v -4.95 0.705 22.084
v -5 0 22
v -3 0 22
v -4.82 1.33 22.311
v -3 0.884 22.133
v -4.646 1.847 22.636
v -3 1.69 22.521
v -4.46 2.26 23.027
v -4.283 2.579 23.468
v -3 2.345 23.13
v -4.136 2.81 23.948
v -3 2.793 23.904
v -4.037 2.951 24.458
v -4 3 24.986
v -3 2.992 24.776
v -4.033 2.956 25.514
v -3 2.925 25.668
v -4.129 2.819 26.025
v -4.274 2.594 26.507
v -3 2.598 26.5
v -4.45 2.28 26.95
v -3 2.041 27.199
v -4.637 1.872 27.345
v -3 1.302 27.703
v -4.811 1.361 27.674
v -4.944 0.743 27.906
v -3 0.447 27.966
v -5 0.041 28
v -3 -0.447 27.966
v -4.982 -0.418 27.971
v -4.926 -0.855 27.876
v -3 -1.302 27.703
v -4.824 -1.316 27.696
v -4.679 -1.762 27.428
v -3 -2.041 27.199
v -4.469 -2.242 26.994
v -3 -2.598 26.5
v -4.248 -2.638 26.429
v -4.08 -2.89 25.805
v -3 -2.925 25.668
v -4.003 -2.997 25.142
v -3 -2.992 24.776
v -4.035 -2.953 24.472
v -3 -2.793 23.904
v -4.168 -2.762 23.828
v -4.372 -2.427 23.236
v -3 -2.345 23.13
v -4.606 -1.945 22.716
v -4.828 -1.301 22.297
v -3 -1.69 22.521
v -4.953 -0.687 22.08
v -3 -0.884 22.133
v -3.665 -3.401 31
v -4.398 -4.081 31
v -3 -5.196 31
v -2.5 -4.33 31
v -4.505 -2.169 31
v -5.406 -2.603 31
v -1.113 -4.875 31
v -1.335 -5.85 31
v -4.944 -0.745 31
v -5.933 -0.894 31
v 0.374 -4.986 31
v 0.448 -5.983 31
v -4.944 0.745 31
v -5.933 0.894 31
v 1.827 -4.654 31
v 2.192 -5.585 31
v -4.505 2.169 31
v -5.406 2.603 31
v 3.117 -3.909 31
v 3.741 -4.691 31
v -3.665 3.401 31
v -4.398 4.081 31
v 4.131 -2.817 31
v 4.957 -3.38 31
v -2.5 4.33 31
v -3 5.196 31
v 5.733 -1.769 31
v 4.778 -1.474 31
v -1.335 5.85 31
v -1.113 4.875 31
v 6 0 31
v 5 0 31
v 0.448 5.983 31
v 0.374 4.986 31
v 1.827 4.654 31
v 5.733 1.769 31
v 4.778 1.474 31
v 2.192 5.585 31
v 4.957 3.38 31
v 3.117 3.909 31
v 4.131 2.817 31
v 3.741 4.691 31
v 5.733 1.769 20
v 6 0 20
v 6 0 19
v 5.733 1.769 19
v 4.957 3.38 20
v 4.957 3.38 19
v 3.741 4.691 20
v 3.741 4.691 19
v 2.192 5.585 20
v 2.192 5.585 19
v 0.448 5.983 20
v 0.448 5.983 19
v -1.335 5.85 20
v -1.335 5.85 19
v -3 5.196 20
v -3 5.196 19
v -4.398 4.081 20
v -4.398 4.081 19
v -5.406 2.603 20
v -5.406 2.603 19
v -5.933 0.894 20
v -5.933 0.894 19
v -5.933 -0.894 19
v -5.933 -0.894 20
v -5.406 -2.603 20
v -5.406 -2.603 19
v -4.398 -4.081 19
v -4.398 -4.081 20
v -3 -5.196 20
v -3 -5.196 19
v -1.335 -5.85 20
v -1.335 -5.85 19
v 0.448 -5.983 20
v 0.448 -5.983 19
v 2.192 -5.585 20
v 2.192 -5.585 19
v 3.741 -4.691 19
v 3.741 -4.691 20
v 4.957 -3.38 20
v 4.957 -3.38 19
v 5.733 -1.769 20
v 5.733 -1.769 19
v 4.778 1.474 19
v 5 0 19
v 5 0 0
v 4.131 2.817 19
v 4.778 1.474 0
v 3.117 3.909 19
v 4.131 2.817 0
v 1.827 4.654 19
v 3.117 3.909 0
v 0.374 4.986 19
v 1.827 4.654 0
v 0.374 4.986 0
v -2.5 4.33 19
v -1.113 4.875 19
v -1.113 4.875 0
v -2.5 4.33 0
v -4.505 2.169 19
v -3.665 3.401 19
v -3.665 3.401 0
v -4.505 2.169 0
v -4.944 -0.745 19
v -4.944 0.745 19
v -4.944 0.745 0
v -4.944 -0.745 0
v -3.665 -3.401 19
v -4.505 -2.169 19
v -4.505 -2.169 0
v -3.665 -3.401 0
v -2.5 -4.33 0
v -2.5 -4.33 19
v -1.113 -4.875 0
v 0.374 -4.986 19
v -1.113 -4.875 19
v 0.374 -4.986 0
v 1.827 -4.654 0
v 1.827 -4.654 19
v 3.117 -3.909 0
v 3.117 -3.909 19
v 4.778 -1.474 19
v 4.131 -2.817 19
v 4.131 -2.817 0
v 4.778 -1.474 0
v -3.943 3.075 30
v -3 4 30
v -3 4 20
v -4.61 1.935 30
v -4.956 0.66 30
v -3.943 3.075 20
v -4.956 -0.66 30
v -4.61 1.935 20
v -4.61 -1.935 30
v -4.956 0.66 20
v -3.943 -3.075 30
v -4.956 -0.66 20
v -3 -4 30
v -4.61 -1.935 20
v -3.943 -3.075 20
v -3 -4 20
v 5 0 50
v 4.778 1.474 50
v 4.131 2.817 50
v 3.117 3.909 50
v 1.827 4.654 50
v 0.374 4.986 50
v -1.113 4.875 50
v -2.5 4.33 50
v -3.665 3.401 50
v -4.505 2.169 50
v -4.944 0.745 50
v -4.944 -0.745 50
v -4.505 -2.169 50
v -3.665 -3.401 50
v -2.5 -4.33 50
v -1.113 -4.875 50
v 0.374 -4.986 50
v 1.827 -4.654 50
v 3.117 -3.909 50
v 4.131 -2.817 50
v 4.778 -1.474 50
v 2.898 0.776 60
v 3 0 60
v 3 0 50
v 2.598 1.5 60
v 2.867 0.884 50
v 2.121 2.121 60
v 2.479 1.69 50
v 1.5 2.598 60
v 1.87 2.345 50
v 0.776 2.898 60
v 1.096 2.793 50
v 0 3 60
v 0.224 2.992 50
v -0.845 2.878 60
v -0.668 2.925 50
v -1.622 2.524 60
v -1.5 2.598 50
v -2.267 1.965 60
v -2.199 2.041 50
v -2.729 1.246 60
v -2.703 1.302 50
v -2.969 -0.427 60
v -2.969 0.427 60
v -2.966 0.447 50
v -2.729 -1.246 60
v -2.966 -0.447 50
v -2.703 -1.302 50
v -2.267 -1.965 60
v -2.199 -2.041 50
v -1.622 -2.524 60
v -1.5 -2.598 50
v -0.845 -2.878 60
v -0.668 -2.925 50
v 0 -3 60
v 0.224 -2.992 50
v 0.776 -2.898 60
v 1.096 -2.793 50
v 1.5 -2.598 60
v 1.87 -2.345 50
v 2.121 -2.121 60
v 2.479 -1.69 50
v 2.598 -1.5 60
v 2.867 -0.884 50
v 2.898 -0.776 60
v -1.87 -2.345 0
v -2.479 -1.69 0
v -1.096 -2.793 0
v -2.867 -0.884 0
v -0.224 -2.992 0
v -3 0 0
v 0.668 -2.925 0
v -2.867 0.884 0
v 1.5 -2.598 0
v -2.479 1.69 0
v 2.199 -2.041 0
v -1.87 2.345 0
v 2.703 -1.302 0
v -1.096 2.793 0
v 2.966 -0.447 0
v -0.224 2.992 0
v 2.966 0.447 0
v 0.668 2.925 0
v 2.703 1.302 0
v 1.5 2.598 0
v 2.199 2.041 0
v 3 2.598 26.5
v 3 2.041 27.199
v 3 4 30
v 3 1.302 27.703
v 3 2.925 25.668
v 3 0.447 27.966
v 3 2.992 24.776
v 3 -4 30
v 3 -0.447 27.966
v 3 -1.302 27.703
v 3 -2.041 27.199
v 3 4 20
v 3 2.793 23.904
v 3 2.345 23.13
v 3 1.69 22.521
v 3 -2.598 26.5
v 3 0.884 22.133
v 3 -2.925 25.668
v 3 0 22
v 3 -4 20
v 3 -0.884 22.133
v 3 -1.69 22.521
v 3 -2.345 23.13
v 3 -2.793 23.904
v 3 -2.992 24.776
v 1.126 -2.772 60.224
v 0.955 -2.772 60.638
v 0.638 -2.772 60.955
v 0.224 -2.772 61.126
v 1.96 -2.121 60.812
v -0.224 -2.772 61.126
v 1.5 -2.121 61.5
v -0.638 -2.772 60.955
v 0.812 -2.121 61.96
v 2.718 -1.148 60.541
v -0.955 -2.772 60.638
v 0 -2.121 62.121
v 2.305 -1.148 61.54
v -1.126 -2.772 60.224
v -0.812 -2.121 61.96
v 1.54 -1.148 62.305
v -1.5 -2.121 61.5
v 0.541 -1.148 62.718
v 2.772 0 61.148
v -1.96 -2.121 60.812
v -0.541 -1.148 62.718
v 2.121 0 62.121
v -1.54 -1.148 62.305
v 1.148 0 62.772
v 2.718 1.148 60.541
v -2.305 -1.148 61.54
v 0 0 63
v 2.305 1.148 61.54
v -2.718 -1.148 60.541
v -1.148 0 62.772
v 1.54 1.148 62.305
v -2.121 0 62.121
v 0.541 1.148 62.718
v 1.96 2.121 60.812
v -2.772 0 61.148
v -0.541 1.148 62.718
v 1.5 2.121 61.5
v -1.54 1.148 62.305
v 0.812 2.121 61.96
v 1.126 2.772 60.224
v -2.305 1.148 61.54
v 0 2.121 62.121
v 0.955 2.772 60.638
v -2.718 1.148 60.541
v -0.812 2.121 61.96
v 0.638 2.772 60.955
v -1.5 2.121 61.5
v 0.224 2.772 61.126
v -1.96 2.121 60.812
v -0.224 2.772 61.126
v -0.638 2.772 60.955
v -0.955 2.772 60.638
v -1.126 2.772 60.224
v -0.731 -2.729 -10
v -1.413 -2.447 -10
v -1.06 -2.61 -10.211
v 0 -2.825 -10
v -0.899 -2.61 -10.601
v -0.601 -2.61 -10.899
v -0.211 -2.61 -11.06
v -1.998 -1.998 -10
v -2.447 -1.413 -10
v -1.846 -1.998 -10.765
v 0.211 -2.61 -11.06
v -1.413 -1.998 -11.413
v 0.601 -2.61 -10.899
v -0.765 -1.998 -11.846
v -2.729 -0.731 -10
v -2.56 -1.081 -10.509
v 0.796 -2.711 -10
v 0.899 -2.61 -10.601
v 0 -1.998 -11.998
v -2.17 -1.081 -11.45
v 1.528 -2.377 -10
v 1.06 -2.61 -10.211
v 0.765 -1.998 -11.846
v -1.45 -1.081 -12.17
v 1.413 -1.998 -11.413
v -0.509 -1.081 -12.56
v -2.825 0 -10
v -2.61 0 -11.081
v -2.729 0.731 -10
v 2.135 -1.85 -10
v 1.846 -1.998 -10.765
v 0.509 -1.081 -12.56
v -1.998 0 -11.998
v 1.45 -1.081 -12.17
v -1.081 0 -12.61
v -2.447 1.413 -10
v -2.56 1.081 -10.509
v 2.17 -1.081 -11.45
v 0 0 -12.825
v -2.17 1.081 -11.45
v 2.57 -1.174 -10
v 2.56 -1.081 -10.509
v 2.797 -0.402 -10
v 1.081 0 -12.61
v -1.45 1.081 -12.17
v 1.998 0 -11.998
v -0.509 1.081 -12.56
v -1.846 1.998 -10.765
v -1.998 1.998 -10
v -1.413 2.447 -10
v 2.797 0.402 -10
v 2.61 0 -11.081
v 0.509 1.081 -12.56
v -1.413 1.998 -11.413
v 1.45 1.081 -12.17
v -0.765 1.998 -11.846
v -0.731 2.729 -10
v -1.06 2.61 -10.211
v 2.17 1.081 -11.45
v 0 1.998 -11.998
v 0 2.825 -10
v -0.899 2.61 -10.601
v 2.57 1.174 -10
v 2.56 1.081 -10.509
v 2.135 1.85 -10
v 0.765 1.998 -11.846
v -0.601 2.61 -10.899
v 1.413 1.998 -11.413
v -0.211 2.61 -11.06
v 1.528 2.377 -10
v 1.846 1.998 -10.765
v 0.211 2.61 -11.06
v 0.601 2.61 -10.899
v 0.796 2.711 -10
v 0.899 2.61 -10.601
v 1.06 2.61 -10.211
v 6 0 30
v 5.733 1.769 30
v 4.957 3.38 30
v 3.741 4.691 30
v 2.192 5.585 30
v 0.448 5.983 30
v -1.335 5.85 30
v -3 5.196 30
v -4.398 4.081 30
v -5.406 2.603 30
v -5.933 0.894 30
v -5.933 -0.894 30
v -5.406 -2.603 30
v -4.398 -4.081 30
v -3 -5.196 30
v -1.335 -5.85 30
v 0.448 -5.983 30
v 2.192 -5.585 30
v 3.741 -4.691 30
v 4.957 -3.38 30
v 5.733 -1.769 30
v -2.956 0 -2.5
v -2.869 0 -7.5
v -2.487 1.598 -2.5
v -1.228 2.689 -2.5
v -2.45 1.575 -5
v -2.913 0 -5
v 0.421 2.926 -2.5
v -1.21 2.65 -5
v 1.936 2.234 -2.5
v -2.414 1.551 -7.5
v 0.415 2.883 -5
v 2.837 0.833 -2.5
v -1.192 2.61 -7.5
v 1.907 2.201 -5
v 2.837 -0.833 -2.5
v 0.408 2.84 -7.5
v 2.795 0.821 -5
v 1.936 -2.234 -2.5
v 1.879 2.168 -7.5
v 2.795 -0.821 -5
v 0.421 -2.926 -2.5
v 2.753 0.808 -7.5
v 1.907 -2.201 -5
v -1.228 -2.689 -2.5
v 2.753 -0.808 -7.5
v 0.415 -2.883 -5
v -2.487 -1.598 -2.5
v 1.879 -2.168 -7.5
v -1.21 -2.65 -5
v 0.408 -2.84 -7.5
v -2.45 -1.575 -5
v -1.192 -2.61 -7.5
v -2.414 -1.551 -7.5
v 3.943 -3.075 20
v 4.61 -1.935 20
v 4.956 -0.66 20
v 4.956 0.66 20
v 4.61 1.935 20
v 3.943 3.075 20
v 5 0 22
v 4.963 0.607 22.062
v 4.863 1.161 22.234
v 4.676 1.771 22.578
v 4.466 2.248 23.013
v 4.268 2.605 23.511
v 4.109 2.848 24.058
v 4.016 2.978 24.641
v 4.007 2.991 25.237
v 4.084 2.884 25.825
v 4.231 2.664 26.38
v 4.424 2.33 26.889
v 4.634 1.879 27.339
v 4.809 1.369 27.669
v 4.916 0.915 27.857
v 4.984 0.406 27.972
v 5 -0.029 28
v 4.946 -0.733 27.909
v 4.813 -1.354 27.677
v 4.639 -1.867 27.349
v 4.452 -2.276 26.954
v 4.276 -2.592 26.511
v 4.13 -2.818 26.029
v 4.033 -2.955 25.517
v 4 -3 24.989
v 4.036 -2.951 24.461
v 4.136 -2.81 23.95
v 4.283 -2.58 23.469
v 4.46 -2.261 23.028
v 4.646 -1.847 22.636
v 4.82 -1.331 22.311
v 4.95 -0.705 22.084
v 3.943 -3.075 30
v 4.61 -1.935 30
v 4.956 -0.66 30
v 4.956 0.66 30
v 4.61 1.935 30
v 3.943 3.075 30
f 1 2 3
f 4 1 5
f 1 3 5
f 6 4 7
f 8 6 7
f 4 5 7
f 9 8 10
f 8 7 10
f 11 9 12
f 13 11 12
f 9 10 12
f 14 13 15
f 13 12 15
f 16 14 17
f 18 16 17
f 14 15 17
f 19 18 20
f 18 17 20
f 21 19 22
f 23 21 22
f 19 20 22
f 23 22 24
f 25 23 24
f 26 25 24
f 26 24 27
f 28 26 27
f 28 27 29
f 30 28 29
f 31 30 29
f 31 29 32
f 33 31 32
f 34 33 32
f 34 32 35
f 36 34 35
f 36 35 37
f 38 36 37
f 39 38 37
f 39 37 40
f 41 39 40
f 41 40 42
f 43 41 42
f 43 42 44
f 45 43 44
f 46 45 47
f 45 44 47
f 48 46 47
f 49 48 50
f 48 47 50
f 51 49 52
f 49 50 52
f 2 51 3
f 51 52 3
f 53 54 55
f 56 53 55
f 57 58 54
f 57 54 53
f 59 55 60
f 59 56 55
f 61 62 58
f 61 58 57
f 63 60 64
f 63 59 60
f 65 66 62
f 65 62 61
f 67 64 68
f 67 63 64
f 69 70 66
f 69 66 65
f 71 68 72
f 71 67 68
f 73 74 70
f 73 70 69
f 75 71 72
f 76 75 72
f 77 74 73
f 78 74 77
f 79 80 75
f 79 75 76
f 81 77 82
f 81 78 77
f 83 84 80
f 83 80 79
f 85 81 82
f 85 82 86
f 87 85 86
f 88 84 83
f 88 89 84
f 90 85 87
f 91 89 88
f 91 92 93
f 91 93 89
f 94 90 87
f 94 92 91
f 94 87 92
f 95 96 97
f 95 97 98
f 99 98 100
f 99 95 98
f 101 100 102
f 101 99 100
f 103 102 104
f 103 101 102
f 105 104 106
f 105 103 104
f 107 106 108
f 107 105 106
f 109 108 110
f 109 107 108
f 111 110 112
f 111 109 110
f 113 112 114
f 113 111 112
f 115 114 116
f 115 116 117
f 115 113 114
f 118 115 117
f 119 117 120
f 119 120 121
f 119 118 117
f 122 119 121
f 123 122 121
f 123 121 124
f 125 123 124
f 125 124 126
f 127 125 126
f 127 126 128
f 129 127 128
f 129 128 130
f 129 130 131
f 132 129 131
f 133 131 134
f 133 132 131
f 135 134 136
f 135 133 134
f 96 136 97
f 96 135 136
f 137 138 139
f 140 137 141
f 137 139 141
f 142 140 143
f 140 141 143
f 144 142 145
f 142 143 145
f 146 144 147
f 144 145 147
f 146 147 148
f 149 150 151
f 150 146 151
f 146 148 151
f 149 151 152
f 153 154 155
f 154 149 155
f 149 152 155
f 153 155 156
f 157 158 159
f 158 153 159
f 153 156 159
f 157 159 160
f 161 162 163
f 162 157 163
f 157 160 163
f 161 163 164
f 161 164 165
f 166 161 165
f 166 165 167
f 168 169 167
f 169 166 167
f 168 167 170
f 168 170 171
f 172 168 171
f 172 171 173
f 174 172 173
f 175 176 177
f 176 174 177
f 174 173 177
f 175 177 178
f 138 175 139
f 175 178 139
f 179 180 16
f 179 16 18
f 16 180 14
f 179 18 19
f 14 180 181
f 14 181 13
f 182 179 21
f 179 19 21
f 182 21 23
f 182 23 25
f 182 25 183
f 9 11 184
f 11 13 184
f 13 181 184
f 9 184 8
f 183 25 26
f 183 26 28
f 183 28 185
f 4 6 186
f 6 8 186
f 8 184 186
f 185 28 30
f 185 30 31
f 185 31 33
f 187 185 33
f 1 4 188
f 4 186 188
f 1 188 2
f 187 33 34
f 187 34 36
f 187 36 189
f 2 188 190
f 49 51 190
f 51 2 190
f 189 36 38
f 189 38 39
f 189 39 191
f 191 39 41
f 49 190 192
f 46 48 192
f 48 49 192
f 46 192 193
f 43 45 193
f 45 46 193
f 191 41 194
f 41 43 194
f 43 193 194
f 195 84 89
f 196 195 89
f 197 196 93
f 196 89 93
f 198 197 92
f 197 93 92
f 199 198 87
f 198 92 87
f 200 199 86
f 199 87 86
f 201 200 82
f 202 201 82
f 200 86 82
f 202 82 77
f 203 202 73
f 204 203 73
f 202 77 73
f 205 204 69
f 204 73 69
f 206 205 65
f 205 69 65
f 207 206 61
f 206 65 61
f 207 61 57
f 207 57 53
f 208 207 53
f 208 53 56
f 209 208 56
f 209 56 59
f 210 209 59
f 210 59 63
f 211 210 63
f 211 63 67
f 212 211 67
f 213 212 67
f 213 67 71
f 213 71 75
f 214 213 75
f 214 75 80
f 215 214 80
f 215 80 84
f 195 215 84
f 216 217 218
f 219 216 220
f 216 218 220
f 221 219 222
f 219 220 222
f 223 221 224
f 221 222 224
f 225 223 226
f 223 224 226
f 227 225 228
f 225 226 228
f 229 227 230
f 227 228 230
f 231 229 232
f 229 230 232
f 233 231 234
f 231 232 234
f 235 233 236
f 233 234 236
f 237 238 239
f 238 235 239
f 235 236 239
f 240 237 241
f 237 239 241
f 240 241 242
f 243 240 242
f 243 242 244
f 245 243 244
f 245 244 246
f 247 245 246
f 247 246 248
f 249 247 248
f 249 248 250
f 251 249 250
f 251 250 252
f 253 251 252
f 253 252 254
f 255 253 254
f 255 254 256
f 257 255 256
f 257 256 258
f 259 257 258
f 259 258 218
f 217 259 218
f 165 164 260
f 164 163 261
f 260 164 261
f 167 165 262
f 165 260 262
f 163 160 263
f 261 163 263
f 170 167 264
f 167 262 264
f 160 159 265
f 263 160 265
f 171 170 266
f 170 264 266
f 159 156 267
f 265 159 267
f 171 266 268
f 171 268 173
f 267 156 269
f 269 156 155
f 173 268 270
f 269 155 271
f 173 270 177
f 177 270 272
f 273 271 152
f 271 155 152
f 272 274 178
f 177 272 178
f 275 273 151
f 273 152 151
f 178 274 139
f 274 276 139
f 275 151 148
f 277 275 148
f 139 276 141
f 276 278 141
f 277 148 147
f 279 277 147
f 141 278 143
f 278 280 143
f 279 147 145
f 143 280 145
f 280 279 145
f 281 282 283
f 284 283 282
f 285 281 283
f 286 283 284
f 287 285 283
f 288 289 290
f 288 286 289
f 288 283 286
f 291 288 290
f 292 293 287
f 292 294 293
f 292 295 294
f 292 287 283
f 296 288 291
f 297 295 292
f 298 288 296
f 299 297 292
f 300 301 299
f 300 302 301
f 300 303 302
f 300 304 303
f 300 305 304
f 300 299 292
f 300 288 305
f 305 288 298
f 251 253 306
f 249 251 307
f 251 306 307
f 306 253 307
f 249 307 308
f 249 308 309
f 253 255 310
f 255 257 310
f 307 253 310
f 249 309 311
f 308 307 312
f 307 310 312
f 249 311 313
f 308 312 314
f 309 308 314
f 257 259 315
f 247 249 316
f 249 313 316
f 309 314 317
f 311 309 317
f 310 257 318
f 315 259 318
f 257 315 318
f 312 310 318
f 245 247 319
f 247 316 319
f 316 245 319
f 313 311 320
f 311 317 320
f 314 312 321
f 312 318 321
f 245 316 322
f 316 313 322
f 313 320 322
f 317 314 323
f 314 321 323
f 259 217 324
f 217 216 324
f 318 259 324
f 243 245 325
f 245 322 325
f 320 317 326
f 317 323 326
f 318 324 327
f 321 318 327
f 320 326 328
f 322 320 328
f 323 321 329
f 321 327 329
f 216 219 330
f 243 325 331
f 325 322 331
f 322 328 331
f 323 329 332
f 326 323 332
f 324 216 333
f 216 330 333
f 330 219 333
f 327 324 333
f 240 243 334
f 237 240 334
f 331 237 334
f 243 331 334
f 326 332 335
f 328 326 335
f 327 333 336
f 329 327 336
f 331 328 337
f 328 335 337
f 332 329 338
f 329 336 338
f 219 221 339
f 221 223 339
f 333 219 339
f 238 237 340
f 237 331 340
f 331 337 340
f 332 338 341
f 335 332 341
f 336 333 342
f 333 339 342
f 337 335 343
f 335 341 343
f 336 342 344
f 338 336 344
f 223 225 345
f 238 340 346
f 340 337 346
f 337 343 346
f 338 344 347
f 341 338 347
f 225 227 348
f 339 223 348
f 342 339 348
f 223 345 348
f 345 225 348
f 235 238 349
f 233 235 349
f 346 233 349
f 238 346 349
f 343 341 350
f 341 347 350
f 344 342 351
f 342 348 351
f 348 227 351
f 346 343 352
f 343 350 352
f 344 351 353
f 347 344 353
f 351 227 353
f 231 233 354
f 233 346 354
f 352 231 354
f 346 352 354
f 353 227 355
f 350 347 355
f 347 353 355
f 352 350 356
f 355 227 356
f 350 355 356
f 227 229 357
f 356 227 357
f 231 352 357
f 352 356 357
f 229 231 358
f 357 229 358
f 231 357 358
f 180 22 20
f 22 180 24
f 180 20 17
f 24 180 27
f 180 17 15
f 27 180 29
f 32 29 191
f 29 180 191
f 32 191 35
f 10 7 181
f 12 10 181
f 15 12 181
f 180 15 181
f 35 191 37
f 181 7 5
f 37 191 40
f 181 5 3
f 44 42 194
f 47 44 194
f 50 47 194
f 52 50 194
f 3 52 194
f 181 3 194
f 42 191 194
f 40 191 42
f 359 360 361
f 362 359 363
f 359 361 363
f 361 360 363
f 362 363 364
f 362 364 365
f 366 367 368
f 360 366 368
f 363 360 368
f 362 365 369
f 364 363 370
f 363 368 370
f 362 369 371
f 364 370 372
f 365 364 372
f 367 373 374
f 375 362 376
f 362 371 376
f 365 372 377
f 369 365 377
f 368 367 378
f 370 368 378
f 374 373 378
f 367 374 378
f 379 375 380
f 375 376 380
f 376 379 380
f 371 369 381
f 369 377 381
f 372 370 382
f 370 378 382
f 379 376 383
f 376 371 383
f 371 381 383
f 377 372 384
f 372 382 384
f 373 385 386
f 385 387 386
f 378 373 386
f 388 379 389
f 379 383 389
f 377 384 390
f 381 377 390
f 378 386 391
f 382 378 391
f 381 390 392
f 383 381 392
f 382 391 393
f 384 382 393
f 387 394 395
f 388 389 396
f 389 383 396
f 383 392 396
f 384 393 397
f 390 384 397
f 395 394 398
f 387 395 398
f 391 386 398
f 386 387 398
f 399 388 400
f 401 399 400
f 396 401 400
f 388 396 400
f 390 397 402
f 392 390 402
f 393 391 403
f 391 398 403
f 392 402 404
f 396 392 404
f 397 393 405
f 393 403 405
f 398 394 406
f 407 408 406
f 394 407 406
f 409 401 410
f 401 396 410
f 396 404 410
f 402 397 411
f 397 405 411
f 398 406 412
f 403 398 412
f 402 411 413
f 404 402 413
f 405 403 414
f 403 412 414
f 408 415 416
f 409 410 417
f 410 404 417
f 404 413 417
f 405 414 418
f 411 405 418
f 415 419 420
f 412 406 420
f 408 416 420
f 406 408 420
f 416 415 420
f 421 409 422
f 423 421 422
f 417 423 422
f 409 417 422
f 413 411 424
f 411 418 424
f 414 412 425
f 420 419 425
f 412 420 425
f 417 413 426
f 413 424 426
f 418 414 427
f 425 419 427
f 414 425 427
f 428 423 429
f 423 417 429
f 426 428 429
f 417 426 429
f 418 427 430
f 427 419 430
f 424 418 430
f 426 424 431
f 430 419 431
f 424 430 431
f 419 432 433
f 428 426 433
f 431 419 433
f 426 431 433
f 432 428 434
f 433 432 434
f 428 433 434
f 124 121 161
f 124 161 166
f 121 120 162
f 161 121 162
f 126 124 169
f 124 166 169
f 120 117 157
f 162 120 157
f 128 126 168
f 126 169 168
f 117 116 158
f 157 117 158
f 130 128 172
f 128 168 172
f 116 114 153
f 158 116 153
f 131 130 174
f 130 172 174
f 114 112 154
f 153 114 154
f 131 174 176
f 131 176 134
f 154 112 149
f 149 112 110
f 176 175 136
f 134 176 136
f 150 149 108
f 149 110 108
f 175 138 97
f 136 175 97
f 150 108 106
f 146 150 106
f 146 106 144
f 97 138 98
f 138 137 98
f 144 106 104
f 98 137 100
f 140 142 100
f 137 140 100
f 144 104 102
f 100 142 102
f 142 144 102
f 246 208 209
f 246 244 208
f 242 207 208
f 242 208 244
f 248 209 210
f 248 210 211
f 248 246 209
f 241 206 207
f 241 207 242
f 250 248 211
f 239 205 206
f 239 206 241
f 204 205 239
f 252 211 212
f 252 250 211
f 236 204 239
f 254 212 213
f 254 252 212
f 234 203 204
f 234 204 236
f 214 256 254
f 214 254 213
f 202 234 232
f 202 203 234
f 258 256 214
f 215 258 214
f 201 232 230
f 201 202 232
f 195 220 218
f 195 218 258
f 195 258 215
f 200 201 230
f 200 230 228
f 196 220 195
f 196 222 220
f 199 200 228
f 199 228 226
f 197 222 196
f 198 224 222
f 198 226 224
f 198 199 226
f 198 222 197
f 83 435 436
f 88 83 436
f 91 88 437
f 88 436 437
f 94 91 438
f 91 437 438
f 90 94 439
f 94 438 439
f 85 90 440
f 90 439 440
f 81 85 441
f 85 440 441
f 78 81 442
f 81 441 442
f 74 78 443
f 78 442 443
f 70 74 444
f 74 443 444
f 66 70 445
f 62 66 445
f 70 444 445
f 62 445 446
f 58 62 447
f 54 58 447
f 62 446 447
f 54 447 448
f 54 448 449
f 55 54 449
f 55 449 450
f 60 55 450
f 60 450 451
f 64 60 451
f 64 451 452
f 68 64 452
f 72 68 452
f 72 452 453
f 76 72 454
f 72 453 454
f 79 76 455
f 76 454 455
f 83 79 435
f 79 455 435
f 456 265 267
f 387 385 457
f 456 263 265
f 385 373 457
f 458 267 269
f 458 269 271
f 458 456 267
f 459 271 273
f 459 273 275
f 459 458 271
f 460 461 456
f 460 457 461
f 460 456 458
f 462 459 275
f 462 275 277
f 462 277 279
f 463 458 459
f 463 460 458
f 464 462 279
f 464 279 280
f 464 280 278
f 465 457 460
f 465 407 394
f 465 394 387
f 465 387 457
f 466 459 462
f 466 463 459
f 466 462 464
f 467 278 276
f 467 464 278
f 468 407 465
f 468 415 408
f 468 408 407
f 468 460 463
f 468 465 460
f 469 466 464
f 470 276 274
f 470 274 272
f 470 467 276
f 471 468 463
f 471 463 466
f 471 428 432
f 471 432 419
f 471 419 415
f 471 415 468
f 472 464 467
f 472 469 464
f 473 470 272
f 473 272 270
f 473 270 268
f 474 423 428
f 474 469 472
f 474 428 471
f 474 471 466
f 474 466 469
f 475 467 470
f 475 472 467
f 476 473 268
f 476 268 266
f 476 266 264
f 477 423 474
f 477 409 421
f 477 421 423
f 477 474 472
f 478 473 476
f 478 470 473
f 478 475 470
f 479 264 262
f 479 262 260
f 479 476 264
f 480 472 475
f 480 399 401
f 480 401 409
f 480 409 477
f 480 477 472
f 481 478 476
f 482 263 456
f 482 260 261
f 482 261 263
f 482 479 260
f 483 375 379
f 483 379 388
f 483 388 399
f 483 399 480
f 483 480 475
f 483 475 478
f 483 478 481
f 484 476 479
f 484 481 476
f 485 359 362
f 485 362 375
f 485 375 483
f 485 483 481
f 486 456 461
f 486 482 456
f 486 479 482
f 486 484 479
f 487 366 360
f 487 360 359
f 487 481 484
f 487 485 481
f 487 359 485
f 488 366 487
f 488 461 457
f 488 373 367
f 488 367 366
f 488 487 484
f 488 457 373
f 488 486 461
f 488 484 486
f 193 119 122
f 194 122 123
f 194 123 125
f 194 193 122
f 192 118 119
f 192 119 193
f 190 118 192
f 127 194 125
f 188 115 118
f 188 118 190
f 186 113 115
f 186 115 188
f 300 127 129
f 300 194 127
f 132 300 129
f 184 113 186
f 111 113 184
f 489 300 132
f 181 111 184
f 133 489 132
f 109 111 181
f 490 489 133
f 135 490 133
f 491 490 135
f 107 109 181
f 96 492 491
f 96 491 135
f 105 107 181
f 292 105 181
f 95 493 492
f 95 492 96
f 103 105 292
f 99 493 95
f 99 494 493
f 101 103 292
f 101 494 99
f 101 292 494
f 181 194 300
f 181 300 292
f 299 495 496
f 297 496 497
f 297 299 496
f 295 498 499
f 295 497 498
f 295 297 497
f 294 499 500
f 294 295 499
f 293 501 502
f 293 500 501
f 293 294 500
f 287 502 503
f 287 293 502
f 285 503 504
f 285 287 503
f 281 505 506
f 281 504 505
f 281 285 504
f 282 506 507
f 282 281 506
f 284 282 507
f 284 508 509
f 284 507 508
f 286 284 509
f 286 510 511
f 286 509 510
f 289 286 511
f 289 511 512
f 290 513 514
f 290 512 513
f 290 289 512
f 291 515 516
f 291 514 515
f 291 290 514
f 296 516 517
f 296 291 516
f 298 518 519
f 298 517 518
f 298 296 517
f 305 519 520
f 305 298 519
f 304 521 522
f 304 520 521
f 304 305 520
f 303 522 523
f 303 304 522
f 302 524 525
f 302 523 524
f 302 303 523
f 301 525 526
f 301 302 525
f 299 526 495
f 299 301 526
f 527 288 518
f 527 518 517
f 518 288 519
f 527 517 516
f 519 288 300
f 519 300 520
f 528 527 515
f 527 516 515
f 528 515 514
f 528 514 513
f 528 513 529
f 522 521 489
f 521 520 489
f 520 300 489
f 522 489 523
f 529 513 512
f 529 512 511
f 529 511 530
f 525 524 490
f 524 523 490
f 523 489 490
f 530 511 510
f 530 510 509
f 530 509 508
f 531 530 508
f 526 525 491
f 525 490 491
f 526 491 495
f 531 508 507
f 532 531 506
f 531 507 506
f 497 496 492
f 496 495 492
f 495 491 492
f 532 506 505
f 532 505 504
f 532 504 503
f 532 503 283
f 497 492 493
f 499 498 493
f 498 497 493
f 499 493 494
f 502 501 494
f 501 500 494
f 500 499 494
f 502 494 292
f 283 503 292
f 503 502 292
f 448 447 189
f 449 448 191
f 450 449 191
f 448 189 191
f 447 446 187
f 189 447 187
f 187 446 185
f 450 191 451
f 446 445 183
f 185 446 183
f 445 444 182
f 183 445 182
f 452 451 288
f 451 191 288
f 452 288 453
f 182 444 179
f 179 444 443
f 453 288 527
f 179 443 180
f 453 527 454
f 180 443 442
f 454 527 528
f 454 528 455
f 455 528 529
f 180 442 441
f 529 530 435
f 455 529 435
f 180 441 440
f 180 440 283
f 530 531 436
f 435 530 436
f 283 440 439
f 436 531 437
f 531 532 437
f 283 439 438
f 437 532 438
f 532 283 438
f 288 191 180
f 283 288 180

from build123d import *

# Parameters (mm, degrees)
SKETCH2_R               = 5
BOSS_EXTRUDE1_DEPTH     = 50
SKETCH3_R               = 3
BOSS_EXTRUDE2_DEPTH     = 10
BOSS_EXTRUDE2_TAPER     = 1
SKETCH5_R               = 3
BOSS_EXTRUDE3_DEPTH     = 10
CUT_EXTRUDE1_DEPTH      = 10
CUT_EXTRUDE1_DEPTH_BACK = 10
SKETCH7_W               = 6
SKETCH7_H               = 10
CUT_EXTRUDE2_DEPTH      = 10
CUT_EXTRUDE2_DEPTH_BACK = 10
SKETCH8_R               = 3
SKETCH10_R              = 6
BOSS_EXTRUDE4_DEPTH     = 1
BOSS_EXTRUDE5_START     = 1
SKETCH11_R              = 6
BOSS_EXTRUDE5_DEPTH     = 1


with BuildPart() as part:
    # Sketch2 → Boss-Extrude1 (new body)
    with BuildSketch(Plane.XY):
        Circle(SKETCH2_R)
    extrude(amount=BOSS_EXTRUDE1_DEPTH)

    # Sketch3 → Boss-Extrude2 (add)
    with BuildSketch(Plane(origin=(0, 0, 0), x_dir=(-1, 0, 0), z_dir=(0, 0, -1))):
        Circle(SKETCH3_R)
    extrude(amount=BOSS_EXTRUDE2_DEPTH, taper=BOSS_EXTRUDE2_TAPER)

    # Sketch5 → Boss-Extrude3 (add)
    with BuildSketch(Plane.XY.offset(50)):
        Circle(SKETCH5_R)
    extrude(amount=BOSS_EXTRUDE3_DEPTH)

    # Sketch7 → Cut-Extrude1 (cut, two sides: drawn at the far end of the back side and taken through both)
    with BuildSketch(Plane(origin=(0, 0, 0), x_dir=(1, 0, 0), z_dir=(0, 1, 0)).offset(-CUT_EXTRUDE1_DEPTH_BACK)):
        with Locations((0, -25)):
            Rectangle(SKETCH7_W, SKETCH7_H)
    extrude(amount=CUT_EXTRUDE1_DEPTH + CUT_EXTRUDE1_DEPTH_BACK, mode=Mode.SUBTRACT)

    # Sketch8 → Cut-Extrude2 (cut, two sides: drawn at the far end of the back side and taken through both)
    with BuildSketch(Plane(origin=(0, 0, 0), x_dir=(0, 0, -1), z_dir=(1, 0, 0)).offset(-CUT_EXTRUDE2_DEPTH_BACK)):
        with Locations((-25, 0)):
            Circle(SKETCH8_R)
    extrude(amount=CUT_EXTRUDE2_DEPTH + CUT_EXTRUDE2_DEPTH_BACK, mode=Mode.SUBTRACT)

    # Sketch6 → Revolve1 (revolve)
    with BuildSketch(Plane.XY.offset(60)):
        with BuildLine():
            Line((0, 3), (0, -3))
            ThreePointArc((0, -3), (-3, 0), (0, 3))
        make_face()
    revolve(axis=Axis((0, 3, 60), (0, -1, 0)))

    # Sketch4 → Revolve2 (revolve)
    with BuildSketch(Plane(origin=(0, 0, -10), x_dir=(-1, 0, 0), z_dir=(0, 0, -1))):
        with BuildLine():
            Line((0, 2.825449351), (0, -2.825449351))
            ThreePointArc((0, -2.825449351), (-2.825449351, 0), (0, 2.825449351))
        make_face()
    revolve(axis=Axis((0, 2.825449351, -10), (0, -1, 0)))

    # Sketch10 → Boss-Extrude4 (add)
    with BuildSketch(Plane.XY.offset(20)):
        Circle(SKETCH10_R)
    extrude(amount=-BOSS_EXTRUDE4_DEPTH)

    # Sketch11 → Boss-Extrude5 (add)
    with BuildSketch(Plane.XY.offset(30).offset(BOSS_EXTRUDE5_START)):
        Circle(SKETCH11_R)
    extrude(amount=-BOSS_EXTRUDE5_DEPTH)


solid = part.part
